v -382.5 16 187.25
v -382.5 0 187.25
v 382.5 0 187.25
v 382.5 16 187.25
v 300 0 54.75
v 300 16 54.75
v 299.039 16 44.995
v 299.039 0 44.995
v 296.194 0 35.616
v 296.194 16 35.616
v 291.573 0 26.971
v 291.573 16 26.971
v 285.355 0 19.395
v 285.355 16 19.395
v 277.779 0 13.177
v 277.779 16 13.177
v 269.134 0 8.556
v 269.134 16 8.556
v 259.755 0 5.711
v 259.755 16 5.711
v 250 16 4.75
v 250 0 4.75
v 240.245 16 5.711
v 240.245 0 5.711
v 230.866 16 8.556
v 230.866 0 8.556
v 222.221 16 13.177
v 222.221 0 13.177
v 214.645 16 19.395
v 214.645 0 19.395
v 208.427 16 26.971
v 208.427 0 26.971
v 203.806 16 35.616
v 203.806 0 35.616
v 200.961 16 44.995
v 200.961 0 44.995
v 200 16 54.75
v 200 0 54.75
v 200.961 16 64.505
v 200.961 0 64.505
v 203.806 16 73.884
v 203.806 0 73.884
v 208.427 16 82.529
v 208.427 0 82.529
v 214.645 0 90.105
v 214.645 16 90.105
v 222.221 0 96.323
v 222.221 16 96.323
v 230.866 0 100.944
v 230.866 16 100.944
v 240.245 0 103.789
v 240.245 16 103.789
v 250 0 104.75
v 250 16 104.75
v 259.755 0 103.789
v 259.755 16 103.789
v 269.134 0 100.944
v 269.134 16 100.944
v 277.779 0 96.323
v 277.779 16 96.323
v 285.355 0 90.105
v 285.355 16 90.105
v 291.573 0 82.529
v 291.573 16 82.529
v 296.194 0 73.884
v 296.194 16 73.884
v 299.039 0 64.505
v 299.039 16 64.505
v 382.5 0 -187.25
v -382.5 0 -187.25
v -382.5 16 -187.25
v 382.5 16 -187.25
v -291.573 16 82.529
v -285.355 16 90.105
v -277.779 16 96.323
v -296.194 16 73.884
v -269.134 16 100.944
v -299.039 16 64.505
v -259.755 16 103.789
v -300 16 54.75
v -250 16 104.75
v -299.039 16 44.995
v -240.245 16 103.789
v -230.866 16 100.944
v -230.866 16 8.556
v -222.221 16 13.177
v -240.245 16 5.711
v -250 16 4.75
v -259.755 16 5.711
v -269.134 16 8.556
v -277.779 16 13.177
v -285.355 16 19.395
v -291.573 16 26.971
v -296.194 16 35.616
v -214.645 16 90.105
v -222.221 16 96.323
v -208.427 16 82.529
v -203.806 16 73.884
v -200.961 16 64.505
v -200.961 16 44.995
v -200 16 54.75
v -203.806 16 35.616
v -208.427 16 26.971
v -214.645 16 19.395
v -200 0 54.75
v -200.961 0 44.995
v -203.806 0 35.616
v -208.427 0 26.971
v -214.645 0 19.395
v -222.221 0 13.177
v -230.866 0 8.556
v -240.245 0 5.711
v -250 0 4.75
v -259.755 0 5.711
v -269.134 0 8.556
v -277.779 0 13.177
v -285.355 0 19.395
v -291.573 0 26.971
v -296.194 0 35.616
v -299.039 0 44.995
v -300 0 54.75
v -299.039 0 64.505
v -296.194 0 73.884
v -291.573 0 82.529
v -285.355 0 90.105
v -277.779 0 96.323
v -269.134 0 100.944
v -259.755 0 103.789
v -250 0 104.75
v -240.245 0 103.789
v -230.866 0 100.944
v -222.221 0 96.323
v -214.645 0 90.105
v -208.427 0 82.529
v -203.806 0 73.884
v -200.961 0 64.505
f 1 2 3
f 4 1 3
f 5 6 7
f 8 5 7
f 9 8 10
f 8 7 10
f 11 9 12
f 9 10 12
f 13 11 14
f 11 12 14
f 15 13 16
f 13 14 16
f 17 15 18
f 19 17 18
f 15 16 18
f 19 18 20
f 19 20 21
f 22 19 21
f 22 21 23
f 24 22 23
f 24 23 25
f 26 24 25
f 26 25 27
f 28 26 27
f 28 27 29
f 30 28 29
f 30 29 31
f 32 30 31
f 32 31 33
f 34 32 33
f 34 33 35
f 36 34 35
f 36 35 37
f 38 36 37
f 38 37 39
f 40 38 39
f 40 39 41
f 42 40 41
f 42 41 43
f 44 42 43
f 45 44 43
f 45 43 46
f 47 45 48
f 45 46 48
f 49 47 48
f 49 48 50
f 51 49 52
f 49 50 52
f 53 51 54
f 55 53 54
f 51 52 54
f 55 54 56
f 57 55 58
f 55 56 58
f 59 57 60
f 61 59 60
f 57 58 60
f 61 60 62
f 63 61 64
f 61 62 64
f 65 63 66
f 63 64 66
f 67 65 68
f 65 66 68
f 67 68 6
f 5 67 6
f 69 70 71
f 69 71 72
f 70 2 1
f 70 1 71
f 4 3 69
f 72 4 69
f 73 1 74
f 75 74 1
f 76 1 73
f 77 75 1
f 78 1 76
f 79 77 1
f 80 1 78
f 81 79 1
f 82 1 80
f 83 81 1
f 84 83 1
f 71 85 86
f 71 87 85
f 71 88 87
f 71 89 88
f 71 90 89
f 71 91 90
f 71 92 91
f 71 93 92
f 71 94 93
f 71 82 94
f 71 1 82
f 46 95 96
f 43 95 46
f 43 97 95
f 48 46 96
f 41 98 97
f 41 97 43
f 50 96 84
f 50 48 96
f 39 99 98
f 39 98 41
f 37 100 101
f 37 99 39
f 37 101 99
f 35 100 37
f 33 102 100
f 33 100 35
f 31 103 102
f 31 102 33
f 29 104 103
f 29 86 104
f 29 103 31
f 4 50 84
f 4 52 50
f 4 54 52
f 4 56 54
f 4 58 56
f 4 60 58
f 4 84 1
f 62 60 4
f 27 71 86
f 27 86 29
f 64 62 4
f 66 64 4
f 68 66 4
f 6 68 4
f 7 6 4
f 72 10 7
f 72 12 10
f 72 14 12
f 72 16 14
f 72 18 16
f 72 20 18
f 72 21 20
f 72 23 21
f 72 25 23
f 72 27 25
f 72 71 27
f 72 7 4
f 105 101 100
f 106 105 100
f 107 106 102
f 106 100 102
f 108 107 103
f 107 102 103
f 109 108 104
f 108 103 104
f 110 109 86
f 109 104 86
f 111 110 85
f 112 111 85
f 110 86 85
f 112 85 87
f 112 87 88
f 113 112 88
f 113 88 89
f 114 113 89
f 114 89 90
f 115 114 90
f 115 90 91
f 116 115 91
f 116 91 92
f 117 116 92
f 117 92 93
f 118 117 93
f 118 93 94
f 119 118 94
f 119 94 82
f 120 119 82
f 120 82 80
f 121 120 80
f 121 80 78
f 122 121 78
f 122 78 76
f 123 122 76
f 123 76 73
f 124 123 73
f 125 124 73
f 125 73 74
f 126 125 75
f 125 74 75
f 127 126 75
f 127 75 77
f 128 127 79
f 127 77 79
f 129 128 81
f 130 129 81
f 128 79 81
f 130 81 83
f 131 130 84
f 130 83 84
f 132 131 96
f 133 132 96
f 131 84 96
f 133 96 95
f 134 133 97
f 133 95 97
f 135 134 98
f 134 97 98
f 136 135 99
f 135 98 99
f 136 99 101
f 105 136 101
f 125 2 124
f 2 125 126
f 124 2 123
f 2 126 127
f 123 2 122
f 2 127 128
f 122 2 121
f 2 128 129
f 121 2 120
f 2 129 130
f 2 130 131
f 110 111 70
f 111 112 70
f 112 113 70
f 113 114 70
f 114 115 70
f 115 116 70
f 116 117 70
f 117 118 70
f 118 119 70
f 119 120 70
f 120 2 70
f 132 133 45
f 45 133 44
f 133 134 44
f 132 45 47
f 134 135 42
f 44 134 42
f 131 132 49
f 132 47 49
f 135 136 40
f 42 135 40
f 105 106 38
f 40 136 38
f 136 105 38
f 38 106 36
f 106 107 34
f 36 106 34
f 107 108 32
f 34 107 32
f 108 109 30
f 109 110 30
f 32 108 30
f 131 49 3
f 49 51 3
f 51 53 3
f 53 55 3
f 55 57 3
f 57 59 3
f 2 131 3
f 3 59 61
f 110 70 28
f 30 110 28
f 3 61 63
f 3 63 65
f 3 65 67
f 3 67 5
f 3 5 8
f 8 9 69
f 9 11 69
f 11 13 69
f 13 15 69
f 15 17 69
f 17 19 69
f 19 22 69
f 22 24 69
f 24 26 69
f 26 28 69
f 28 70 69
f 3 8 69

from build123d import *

# Parameters (mm, degrees)
SKETCH1_W                      = 765
SKETCH1_H                      = 374.5
BOSS_EXTRUDE1_DEPTH            = 16
CUT_EXTRUDE1_REACH             = 18
SKETCH2_R                      = 50
CUT_EXTRUDE1_DIRECTION_2_DEPTH = 1


with BuildPart() as part:
    # Sketch1 → Boss-Extrude1 (new body)
    with BuildSketch(Plane(origin=(0, 0, 0), x_dir=(1, 0, 0), z_dir=(0, 1, 0))):
        Rectangle(SKETCH1_W, SKETCH1_H)
    extrude(amount=BOSS_EXTRUDE1_DEPTH)

    # Sketch2 → Cut-Extrude1 (cut, up to next)
    with BuildSketch(Plane(origin=(0, 16, 0), x_dir=(1, 0, 0), z_dir=(0, 1, 0)), mode=Mode.PRIVATE) as cut_extrude1_sk1:
        with Locations((-250, -54.75)):
            Circle(SKETCH2_R)
    cut_extrude1_tool1 = extrude(cut_extrude1_sk1.sketch, amount=-CUT_EXTRUDE1_REACH, mode=Mode.PRIVATE) & part.part
    add(cut_extrude1_tool1.solids().sort_by_distance((-250, 16, 54.75))[0], mode=Mode.SUBTRACT)
    # Sketch2 → Cut-Extrude1 (cut, up to next)
    with BuildSketch(Plane(origin=(0, 16, 0), x_dir=(1, 0, 0), z_dir=(0, 1, 0)), mode=Mode.PRIVATE) as cut_extrude1_sk2:
        with Locations((250, -54.75)):
            Circle(SKETCH2_R)
    cut_extrude1_tool2 = extrude(cut_extrude1_sk2.sketch, amount=-CUT_EXTRUDE1_REACH, mode=Mode.PRIVATE) & part.part
    add(cut_extrude1_tool2.solids().sort_by_distance((250, 16, 54.75))[0], mode=Mode.SUBTRACT)

    # Sketch2 → Cut-Extrude1 direction 2 (cut)
    with BuildSketch(Plane(origin=(0, 16, 0), x_dir=(1, 0, 0), z_dir=(0, 1, 0))):
        with Locations((-250, -54.75)):
            Circle(SKETCH2_R)
        with Locations((250, -54.75)):
            Circle(SKETCH2_R)
    extrude(amount=CUT_EXTRUDE1_DIRECTION_2_DEPTH, mode=Mode.SUBTRACT)


solid = part.part
